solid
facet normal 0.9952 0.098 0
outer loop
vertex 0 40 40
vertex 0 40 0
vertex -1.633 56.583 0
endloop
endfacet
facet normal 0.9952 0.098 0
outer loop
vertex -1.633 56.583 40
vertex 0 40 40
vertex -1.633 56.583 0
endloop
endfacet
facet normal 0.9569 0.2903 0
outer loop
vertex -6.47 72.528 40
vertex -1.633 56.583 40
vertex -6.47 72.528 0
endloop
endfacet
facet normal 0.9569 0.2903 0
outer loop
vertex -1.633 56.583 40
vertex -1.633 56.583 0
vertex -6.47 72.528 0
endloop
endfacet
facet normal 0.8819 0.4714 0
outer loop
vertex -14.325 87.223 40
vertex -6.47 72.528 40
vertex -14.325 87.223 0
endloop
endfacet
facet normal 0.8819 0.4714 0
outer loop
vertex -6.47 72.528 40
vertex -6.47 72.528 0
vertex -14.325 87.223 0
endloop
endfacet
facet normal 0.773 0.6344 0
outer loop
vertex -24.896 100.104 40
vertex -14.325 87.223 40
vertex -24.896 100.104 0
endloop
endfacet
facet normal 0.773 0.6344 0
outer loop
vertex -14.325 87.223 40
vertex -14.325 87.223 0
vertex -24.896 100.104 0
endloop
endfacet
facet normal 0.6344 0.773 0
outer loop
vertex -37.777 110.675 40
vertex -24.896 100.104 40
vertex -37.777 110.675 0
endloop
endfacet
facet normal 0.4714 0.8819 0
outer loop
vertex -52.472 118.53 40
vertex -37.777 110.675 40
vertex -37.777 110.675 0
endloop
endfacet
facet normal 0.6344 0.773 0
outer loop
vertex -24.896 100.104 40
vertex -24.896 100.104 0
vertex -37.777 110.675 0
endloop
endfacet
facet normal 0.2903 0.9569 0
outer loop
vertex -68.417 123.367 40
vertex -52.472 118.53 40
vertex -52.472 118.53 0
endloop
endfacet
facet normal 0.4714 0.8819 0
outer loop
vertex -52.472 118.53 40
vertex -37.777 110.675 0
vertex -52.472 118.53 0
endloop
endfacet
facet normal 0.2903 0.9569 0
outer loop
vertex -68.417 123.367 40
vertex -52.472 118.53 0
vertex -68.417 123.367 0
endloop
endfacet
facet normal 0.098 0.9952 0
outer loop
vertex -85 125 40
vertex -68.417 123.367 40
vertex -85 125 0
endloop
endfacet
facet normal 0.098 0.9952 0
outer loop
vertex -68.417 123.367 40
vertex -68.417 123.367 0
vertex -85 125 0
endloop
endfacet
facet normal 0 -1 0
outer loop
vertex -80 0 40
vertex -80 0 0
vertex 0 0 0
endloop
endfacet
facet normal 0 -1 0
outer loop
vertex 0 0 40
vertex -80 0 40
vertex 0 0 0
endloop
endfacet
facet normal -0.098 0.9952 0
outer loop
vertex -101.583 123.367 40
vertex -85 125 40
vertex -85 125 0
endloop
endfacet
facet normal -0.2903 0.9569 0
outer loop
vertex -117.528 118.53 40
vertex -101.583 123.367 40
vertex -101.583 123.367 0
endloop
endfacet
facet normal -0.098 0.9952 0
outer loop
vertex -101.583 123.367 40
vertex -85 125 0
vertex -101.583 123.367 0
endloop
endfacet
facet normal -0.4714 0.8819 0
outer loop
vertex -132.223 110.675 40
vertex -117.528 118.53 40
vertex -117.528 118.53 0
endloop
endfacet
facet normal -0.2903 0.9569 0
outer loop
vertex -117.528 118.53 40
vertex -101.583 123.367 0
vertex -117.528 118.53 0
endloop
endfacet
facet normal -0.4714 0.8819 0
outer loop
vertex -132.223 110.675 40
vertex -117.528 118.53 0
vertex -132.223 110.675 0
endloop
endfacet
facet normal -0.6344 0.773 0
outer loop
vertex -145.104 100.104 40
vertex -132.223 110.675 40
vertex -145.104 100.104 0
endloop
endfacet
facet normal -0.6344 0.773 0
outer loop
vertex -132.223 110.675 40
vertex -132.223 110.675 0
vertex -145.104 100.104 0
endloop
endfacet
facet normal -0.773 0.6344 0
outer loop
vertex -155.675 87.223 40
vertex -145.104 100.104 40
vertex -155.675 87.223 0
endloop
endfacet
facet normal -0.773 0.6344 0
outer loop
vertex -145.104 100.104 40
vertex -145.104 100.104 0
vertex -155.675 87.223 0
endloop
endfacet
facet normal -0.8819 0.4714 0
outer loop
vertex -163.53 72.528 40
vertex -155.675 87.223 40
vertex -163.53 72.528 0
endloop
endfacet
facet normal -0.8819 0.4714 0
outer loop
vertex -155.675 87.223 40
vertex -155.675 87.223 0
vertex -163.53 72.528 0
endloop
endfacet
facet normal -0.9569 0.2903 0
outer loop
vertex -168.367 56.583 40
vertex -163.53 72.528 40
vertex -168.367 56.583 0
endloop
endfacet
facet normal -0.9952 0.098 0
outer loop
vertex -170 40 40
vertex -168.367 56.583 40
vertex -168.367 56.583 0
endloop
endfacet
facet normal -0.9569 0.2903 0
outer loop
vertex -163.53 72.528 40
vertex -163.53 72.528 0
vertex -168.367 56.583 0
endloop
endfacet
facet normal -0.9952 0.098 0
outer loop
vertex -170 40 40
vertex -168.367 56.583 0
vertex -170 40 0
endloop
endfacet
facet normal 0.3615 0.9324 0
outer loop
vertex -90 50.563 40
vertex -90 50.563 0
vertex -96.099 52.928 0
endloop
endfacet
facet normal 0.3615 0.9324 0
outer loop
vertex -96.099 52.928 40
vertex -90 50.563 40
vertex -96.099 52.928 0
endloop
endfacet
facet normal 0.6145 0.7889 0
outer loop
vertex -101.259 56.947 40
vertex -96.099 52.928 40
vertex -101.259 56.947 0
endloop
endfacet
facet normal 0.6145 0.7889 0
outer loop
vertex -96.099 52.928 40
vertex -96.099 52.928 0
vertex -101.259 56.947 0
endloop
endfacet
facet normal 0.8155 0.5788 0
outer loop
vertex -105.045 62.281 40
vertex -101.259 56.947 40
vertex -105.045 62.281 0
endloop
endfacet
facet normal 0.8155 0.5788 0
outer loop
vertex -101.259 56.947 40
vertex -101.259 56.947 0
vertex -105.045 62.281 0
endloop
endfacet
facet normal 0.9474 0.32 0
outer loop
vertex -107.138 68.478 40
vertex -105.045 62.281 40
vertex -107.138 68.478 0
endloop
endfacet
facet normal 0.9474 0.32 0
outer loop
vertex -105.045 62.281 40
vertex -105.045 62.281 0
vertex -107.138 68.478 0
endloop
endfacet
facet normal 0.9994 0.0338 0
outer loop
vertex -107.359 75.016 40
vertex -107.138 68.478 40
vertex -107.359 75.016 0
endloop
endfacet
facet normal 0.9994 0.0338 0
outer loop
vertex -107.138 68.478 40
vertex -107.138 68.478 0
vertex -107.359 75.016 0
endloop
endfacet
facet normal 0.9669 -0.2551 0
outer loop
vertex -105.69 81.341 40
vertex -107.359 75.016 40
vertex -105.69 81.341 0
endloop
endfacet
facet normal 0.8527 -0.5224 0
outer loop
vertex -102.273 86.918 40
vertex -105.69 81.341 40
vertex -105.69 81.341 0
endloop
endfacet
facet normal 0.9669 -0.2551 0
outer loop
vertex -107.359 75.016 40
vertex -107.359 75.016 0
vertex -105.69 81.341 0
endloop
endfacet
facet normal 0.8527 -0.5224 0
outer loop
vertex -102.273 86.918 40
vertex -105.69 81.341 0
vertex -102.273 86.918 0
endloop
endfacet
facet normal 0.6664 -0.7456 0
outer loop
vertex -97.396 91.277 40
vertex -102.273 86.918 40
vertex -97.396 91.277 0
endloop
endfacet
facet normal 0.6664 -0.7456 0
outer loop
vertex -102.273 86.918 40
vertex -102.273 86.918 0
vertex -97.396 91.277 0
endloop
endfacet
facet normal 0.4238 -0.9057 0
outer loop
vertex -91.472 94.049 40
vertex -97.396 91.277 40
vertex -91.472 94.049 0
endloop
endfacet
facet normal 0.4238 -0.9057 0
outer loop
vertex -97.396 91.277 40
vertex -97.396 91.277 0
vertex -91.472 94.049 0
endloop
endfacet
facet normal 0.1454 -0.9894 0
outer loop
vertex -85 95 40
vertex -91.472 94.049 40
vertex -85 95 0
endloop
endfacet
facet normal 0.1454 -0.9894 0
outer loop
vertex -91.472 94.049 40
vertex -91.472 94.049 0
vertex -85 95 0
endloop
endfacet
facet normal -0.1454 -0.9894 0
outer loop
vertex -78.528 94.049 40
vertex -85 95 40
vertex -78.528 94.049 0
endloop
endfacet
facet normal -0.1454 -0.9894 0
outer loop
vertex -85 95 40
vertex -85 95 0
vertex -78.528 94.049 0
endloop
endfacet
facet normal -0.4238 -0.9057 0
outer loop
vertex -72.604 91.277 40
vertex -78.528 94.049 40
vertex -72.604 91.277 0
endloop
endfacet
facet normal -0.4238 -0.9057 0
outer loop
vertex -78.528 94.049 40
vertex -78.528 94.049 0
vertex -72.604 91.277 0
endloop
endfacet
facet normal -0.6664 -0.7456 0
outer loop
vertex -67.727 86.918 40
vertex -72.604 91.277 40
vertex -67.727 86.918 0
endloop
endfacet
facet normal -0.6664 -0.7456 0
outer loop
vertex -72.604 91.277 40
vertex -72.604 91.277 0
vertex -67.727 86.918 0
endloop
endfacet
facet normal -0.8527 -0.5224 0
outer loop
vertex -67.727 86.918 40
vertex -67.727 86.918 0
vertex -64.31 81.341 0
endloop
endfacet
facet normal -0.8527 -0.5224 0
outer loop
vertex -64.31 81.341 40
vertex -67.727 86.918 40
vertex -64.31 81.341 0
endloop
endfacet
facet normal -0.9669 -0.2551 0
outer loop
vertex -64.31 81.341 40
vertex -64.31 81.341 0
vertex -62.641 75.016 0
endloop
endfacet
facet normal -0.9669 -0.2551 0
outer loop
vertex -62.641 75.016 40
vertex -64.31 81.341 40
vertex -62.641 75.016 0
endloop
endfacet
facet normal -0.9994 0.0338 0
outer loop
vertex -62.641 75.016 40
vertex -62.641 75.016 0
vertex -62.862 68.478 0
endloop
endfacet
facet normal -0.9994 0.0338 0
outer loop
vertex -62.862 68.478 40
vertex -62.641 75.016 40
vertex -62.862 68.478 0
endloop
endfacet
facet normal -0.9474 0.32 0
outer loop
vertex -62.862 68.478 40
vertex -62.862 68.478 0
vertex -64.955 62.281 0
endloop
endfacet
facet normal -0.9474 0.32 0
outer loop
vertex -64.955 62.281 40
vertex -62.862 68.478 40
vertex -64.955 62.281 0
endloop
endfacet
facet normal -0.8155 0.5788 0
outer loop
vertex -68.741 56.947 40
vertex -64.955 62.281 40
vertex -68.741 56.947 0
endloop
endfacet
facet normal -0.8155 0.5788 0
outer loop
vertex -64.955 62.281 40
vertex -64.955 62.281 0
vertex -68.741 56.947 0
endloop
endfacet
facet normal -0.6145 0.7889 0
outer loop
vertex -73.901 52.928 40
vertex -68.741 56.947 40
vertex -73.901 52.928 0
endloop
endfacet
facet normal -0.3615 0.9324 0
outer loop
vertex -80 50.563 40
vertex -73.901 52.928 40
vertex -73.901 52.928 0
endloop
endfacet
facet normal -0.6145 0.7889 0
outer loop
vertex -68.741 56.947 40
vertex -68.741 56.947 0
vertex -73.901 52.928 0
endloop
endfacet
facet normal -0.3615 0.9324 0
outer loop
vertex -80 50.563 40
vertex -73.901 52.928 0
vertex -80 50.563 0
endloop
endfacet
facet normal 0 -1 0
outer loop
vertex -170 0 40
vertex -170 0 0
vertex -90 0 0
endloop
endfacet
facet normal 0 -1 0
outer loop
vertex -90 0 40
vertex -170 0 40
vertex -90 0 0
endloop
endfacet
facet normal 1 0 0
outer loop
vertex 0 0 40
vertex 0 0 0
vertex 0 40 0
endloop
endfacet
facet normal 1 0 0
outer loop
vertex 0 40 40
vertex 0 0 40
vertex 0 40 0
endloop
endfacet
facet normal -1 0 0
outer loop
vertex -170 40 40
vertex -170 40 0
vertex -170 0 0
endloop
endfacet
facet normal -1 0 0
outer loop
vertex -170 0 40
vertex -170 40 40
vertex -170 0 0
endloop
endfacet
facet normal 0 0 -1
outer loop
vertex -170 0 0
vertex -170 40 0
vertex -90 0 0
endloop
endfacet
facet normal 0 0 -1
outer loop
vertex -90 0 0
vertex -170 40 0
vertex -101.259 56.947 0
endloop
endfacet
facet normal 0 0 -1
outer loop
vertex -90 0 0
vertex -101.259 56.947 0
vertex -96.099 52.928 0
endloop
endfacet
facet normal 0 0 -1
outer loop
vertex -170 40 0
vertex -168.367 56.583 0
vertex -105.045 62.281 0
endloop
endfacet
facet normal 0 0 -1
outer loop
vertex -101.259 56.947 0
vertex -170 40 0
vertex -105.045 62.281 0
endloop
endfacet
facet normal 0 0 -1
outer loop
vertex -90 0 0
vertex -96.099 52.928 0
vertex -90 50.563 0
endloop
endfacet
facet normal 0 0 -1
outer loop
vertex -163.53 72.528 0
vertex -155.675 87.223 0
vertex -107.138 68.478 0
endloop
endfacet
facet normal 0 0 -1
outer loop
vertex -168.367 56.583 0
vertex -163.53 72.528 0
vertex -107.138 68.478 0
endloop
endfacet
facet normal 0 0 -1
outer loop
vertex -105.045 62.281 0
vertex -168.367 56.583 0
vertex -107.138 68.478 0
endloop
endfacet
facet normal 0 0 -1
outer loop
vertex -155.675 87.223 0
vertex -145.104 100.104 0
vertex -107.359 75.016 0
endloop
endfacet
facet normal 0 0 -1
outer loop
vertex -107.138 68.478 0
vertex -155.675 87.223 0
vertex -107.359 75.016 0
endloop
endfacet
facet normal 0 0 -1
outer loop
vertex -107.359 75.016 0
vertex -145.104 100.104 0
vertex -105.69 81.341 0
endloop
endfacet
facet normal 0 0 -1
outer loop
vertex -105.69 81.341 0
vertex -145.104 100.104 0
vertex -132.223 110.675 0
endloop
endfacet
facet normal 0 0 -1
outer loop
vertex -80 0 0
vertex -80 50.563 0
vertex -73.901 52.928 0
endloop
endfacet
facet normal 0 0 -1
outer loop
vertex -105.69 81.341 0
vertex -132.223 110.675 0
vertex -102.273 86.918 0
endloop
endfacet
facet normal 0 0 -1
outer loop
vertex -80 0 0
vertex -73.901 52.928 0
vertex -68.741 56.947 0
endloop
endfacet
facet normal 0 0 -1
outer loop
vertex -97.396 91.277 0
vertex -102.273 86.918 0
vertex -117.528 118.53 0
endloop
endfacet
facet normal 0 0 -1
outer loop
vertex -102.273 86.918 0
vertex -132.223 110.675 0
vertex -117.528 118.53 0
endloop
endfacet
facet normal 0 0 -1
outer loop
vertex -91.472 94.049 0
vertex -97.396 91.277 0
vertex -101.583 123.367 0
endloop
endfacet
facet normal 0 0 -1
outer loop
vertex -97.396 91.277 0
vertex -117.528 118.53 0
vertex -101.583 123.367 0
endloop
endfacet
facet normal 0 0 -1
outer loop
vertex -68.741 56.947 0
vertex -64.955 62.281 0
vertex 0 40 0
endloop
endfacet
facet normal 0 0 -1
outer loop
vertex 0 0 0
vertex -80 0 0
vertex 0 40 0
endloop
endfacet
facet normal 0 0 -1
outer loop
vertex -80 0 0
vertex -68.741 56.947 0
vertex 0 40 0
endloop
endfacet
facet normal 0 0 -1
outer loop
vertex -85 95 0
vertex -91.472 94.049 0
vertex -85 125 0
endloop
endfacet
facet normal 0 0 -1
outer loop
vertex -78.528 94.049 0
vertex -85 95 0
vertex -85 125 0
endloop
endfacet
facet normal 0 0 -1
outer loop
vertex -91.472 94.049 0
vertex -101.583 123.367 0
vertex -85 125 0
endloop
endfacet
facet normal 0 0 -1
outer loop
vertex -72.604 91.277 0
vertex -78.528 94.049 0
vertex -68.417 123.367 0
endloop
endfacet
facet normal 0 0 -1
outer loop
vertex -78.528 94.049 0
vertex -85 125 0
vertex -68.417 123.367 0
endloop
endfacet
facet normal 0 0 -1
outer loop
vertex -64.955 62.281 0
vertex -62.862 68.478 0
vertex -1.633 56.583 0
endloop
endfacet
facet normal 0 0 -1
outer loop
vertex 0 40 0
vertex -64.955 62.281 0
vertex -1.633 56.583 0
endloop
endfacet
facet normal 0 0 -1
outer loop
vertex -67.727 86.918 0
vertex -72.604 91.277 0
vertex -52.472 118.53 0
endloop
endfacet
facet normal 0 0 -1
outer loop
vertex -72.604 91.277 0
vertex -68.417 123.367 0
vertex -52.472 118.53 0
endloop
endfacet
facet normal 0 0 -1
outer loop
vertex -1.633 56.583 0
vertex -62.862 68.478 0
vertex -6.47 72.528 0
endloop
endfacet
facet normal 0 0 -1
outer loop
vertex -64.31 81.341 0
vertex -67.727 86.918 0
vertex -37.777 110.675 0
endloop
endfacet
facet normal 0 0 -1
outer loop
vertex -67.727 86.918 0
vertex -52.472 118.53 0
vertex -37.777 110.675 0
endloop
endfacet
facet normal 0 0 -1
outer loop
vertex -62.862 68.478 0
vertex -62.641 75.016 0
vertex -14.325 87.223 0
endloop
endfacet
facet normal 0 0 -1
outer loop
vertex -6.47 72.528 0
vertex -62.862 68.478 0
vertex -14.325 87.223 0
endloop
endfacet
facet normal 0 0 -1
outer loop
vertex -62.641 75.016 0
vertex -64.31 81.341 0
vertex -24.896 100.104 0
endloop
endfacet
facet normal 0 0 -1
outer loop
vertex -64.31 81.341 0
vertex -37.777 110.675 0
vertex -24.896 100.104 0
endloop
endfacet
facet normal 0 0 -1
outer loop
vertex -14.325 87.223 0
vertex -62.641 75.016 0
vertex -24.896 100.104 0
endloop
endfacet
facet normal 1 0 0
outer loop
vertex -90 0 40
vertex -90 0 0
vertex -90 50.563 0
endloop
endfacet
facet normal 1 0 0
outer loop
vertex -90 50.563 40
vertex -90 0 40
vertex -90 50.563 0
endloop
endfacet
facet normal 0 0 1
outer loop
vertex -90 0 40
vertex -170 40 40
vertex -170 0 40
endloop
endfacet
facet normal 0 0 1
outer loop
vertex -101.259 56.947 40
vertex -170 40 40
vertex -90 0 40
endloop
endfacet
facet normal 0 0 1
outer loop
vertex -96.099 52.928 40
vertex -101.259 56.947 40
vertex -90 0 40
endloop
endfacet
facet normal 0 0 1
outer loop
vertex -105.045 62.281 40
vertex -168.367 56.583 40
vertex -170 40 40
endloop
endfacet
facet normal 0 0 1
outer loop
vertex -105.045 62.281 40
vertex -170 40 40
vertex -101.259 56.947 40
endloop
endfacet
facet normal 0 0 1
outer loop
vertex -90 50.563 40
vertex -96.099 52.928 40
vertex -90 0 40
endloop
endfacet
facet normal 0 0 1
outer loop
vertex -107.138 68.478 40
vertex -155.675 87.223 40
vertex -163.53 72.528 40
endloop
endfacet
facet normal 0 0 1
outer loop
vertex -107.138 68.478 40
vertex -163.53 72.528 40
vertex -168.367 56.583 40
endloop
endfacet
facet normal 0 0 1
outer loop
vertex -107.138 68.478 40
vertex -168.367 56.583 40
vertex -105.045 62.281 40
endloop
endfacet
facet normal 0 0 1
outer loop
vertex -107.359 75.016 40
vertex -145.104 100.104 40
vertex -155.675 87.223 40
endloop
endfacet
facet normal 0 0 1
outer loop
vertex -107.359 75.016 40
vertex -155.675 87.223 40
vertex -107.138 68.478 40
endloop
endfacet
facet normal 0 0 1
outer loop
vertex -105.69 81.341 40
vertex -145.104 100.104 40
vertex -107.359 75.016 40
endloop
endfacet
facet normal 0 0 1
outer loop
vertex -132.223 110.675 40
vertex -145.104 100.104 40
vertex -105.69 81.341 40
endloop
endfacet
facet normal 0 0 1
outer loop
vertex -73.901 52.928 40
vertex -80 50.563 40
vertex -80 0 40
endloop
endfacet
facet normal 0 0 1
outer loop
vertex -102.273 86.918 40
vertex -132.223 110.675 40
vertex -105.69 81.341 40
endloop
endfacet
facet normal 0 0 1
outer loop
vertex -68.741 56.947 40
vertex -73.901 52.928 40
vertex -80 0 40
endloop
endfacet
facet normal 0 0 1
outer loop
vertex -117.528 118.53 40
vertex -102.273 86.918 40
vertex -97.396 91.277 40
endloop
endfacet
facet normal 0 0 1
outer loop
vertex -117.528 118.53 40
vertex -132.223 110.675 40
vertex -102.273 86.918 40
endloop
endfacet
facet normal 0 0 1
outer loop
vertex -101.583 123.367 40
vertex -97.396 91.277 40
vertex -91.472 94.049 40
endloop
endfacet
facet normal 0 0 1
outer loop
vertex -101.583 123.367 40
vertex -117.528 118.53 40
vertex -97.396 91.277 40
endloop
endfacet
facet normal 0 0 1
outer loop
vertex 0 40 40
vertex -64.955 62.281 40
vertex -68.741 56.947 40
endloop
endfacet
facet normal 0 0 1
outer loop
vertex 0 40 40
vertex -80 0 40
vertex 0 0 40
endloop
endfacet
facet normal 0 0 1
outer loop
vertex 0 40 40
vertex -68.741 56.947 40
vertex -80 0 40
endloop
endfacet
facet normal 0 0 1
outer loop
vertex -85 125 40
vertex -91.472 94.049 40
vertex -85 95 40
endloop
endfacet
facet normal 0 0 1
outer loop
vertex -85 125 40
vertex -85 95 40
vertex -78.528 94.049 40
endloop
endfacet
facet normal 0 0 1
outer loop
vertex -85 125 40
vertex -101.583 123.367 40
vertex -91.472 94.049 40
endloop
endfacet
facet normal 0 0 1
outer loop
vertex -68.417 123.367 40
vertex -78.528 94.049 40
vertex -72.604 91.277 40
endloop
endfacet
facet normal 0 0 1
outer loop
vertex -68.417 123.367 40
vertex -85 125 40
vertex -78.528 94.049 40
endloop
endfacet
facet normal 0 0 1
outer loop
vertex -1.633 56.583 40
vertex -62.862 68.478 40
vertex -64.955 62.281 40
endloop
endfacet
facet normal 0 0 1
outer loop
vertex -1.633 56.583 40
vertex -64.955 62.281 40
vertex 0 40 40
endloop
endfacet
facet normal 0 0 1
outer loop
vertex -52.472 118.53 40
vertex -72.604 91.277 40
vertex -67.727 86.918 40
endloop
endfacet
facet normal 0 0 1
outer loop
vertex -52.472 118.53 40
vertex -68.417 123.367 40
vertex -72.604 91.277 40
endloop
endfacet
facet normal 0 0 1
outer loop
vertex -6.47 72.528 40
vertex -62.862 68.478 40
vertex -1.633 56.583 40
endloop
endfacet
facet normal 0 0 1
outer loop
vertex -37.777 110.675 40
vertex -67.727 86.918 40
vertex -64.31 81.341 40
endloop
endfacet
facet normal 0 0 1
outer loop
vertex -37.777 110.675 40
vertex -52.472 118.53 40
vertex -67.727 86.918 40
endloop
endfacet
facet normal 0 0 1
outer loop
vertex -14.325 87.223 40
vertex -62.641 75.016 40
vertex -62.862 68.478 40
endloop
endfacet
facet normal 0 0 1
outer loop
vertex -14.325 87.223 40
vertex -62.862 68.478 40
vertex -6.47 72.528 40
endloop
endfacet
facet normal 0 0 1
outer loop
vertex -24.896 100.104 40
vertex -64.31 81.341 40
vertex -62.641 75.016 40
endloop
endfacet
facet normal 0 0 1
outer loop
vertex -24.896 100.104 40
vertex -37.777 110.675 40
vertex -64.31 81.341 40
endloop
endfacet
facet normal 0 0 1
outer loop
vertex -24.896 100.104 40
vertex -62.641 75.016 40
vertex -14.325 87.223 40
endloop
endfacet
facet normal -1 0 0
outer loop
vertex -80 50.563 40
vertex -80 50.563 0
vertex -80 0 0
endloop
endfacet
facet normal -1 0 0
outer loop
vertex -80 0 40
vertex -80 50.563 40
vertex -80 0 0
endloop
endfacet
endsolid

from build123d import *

# Parameters (mm, degrees)
F1_DEPTH = 40


with BuildPart() as f1:
    # F0 (on Top) → F1 (new body)
    with BuildSketch(Plane.XY):
        with BuildLine():
            Line((-170, 40), (-170, 0))
            Line((-170, 0), (-90, 0))
            Line((-90, 0), (-90, 50.562589))
            ThreePointArc((-90, 50.562589), (-85, 95), (-80, 50.562589))
            Line((-80, 50.562589), (-80, 0))
            Line((-80, 0), (0, 0))
            Line((0, 0), (0, 40))
            ThreePointArc((0, 40), (-24.895924, 100.104076), (-85, 125))
            ThreePointArc((-85, 125), (-145.104076, 100.104076), (-170, 40))
        make_face()
    extrude(amount=F1_DEPTH)


solid = f1.part
